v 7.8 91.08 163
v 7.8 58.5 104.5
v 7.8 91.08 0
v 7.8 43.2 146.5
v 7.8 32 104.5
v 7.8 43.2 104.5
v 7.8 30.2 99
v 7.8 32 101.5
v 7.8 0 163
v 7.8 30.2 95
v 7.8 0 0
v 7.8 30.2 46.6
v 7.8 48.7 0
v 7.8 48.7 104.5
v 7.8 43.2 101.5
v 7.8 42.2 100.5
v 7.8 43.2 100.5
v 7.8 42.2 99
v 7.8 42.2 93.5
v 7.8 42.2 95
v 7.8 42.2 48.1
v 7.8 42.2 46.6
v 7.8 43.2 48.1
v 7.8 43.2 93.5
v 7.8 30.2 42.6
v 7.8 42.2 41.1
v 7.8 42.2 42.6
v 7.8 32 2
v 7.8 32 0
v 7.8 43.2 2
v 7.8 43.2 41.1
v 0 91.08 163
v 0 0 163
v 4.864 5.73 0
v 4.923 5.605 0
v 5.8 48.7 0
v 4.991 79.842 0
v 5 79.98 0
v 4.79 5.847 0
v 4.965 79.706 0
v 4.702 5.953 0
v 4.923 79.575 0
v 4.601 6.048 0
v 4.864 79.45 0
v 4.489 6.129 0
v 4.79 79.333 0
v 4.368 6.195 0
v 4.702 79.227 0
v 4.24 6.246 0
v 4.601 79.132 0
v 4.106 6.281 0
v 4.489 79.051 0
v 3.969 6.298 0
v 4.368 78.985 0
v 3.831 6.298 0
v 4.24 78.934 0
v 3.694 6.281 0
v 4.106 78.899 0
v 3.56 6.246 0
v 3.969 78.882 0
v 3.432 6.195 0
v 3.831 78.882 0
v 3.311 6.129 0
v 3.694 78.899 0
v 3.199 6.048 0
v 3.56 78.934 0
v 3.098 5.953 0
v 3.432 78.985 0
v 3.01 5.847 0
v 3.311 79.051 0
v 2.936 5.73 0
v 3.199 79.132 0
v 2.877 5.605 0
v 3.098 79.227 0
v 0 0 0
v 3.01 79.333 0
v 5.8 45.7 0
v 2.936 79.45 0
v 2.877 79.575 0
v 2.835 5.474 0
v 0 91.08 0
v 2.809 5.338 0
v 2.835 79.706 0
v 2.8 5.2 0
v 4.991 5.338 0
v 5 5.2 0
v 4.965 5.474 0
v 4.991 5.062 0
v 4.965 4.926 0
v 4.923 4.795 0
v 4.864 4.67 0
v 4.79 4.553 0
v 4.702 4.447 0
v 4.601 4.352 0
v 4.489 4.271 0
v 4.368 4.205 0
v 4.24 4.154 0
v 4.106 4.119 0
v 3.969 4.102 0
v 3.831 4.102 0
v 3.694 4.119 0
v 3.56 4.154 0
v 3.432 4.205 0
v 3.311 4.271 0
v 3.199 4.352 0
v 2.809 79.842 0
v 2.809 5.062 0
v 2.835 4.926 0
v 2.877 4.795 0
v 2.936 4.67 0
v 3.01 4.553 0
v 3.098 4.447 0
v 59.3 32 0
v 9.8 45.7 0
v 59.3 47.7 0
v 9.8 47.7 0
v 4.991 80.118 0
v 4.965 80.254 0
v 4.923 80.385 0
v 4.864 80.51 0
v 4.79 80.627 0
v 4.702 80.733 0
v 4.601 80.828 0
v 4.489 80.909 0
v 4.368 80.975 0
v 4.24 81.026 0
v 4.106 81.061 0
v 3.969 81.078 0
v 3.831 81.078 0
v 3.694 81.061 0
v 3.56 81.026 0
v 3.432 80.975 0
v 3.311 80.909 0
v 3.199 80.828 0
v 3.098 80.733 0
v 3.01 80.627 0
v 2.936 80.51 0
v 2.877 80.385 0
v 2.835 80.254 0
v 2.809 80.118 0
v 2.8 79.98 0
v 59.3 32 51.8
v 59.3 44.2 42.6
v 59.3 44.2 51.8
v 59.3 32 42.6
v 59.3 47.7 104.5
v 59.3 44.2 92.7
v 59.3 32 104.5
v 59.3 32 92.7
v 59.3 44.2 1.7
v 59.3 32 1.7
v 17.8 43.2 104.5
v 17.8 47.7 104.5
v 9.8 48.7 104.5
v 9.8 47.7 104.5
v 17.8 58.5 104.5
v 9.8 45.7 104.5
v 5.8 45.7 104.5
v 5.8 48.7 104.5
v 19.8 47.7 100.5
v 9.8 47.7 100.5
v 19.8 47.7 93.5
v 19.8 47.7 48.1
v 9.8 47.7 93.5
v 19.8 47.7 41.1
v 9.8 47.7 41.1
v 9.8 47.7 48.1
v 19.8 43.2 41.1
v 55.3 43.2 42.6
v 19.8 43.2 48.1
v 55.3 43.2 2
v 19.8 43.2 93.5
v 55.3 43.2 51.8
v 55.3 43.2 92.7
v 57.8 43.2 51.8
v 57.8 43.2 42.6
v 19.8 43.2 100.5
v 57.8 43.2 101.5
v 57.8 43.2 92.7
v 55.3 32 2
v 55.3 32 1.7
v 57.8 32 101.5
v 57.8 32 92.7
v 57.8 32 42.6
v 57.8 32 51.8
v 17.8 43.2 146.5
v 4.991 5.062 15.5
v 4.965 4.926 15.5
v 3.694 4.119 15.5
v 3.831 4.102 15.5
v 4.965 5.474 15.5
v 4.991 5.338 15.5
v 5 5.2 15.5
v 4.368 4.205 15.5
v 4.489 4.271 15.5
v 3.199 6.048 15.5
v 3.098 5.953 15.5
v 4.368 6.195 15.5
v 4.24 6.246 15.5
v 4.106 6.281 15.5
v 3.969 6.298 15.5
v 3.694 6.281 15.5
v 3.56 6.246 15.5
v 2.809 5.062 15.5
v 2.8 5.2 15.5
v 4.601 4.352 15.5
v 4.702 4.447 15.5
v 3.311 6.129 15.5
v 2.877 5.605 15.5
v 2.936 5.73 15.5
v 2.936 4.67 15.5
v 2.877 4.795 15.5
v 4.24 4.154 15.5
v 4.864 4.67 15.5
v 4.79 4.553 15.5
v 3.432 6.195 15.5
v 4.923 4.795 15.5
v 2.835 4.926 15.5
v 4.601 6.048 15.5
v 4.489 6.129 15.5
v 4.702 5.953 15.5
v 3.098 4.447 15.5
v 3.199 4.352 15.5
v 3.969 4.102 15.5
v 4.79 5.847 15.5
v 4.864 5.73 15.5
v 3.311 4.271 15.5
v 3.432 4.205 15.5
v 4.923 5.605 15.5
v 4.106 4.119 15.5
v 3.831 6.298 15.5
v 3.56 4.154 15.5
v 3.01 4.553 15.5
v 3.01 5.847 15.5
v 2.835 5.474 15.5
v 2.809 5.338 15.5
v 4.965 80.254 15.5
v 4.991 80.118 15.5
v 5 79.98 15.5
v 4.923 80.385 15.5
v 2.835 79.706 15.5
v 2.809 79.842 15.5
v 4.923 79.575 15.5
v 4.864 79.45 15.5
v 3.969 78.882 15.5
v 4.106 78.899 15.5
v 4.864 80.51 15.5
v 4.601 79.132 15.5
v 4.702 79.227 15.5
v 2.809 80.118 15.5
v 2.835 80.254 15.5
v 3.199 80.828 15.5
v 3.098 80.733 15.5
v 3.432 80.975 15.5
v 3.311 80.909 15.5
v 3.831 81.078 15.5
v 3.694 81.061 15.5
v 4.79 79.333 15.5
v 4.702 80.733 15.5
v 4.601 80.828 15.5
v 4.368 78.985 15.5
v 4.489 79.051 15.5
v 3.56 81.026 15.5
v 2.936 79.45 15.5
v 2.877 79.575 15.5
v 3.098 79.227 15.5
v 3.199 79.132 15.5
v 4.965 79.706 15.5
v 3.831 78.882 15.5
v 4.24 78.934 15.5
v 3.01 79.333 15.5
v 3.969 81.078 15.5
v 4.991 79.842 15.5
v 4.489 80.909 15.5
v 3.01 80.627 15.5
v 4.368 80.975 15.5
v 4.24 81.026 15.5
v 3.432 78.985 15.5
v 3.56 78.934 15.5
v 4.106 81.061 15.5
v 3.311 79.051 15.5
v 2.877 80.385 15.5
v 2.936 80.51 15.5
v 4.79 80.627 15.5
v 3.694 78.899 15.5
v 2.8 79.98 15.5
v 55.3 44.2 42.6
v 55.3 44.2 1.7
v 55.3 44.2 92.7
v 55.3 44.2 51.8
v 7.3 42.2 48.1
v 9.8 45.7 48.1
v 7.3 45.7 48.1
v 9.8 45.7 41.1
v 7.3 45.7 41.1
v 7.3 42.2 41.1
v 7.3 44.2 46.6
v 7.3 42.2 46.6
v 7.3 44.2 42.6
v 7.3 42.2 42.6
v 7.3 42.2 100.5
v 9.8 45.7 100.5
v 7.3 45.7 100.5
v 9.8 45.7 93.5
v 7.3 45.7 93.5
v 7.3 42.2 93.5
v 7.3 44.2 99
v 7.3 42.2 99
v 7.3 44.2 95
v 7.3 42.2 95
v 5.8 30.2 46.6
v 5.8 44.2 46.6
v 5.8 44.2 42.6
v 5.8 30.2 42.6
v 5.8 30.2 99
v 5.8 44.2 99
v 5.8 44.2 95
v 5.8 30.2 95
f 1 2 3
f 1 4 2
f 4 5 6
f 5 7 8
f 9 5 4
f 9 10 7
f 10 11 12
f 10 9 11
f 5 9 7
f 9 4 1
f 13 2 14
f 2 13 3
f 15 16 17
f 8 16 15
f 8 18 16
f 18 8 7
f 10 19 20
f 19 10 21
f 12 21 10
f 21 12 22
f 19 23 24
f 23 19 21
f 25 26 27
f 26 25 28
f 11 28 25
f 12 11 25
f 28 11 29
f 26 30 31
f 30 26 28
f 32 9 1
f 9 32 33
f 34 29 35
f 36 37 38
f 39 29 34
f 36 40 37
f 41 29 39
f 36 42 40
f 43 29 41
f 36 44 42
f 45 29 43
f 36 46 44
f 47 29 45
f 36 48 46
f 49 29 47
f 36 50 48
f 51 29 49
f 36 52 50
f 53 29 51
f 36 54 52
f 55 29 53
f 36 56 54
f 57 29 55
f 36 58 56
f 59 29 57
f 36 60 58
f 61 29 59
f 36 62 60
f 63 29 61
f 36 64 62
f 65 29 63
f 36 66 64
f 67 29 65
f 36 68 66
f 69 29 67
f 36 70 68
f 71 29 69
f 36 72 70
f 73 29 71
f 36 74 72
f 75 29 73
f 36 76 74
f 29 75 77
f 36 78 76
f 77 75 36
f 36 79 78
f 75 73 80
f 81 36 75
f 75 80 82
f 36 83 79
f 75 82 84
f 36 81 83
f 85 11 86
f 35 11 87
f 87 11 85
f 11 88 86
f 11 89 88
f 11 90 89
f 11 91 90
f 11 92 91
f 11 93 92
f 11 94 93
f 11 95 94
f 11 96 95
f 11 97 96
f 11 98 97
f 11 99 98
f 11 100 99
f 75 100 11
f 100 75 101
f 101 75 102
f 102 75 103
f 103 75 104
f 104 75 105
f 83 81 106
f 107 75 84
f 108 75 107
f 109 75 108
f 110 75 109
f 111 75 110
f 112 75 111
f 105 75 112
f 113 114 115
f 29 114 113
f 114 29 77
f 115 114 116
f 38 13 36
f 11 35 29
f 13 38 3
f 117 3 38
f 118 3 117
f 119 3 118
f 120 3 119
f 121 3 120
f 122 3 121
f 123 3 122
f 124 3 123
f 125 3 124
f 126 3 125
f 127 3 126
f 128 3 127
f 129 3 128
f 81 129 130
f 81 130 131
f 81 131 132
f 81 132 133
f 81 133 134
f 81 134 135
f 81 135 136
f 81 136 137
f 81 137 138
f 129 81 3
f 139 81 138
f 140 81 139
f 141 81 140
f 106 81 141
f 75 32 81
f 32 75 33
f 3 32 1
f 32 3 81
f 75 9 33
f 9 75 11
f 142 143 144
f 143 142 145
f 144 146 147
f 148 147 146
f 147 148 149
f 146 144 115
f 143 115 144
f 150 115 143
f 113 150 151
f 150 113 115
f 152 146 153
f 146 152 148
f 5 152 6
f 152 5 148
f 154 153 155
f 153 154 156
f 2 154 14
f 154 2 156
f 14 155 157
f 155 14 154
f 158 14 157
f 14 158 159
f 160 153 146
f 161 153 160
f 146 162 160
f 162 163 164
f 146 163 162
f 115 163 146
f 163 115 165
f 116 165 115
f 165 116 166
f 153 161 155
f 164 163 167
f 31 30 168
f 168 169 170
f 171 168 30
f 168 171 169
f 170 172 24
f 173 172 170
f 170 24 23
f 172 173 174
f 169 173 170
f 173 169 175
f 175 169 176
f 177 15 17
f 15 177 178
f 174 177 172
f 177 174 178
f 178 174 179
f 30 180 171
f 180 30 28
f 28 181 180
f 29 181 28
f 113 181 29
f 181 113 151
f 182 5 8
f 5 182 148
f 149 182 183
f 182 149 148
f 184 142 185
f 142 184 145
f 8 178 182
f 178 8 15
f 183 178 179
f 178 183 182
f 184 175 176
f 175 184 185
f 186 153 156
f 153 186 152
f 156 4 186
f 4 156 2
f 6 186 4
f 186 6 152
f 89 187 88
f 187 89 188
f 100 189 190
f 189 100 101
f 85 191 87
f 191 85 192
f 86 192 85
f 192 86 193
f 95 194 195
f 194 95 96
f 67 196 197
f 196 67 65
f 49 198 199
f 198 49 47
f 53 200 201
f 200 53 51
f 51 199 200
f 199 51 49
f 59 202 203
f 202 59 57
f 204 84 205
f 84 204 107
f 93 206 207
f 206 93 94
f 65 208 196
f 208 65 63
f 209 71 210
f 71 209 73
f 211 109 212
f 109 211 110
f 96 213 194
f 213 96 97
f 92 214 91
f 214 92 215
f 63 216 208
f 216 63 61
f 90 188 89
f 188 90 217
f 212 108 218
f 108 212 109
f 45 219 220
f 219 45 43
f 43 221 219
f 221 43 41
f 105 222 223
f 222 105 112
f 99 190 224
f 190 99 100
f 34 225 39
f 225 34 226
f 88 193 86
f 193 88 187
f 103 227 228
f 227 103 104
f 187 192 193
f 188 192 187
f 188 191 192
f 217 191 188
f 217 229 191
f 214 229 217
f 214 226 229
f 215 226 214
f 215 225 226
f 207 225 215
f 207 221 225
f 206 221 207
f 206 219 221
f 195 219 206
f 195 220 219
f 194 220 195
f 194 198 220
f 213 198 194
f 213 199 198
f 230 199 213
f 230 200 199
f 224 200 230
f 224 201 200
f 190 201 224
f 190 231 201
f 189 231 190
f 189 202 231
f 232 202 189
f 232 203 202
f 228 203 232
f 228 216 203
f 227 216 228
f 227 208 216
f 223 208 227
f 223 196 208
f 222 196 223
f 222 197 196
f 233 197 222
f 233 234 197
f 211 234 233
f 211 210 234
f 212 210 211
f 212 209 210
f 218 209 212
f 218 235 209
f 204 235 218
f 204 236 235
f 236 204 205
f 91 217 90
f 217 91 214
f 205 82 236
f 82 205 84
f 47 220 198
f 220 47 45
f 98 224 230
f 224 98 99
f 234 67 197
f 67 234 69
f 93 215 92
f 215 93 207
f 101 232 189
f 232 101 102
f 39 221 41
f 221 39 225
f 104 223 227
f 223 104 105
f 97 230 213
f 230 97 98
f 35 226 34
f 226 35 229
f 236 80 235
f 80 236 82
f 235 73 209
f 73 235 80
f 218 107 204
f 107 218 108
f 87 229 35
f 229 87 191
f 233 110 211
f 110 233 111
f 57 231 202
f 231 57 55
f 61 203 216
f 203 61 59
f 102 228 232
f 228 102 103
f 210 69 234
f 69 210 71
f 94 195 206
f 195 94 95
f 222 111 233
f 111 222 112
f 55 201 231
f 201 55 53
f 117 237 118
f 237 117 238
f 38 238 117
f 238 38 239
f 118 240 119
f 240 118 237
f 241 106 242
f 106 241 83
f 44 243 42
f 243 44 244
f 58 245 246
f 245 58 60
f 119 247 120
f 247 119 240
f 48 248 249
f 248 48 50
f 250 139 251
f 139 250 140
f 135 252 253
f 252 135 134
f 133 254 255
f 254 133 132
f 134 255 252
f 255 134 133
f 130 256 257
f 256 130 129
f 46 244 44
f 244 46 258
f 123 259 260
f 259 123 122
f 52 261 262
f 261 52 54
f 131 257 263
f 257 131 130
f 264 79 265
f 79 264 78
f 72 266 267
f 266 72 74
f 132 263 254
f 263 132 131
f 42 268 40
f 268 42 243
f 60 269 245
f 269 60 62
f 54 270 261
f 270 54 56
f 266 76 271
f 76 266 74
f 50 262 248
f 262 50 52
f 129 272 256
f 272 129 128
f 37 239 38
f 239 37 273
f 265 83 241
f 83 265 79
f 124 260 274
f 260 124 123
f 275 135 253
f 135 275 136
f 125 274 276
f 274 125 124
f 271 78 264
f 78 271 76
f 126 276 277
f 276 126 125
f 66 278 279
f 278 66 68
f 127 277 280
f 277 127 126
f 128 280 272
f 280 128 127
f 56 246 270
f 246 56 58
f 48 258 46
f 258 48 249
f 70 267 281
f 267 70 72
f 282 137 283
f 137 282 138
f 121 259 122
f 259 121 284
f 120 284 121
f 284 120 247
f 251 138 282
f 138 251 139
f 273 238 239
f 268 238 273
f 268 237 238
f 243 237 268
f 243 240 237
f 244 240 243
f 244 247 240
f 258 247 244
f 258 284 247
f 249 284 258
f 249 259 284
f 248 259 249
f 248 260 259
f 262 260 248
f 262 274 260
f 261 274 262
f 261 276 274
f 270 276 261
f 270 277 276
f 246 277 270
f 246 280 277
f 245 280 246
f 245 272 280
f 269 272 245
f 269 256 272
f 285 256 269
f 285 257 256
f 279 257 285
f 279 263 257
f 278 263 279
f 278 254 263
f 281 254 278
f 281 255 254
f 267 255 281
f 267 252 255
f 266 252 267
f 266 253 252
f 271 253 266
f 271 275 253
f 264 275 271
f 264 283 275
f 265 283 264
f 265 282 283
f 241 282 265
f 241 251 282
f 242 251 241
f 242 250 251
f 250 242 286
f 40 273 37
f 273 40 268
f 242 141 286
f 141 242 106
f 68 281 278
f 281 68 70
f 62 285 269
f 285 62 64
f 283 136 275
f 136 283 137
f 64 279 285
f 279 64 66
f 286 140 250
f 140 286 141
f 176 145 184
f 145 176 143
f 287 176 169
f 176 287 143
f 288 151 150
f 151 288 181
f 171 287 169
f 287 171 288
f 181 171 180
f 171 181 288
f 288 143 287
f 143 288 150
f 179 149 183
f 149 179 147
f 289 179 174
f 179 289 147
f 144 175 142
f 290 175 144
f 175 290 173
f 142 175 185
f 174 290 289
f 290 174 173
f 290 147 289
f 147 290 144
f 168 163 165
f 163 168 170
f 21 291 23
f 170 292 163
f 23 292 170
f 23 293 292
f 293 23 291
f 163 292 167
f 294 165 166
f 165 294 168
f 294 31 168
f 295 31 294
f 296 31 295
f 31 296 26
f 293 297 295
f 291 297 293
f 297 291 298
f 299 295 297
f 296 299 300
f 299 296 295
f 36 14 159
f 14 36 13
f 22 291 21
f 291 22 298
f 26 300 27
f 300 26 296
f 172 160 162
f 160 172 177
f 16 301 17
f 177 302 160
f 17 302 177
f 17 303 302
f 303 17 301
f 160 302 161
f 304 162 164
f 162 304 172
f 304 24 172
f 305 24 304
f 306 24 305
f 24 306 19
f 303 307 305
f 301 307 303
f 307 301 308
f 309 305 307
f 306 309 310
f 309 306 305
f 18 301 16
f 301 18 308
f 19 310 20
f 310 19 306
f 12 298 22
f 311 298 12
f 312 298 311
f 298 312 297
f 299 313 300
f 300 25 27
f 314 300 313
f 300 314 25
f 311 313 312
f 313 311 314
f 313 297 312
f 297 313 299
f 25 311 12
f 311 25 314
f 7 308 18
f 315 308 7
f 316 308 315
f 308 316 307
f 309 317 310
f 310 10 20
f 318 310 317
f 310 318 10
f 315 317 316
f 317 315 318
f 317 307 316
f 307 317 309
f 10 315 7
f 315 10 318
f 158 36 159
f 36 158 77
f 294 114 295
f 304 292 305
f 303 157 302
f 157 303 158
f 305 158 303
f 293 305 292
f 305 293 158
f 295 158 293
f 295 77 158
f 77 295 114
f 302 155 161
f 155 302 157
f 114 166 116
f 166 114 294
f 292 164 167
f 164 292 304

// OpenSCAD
// ==========================================================
// NAS 双 5010 涡轮风扇 T 型刚性固定支架 (最新实测定稿版)
// 适配: TANK米多贝克 6盘位NAS机箱 + MATX All-in-One + 4热管被动散热器改装
// 坐标定义: X+ 向右(直吹散热鳍片), Y+ 向后(机箱尾部), Z+ 向下(机箱底板)
// ==========================================================

$fn = 50;

// ------------ 关键尺寸参数 (单位: mm) ------------
// 1. 机箱空间与主立板基础尺寸
total_height        = 163.0;    // 机箱顶梁接触面到机箱金属底板总高 (Z: 0 -> 163)
main_plate_th       = 7.8;      // 主固定立板厚度 (X: 0 -> 7.8, 由9.8mm缩减2.0mm，消除机箱滑入装配干涉)

// 2. 螺栓孔参数 (适配梁上原装孔位与 M2.6 自攻螺丝)
h1_y                = 5.20;     // H1 中心距前方阻挡物(硬盘笼端面)基准距离
hole_pitch          = 74.78;    // 两螺栓孔中心距 (实测精确值)
h2_y                = h1_y + hole_pitch; // 79.98mm
hole_dia            = 2.2;      // 适配 M2.6 自攻螺丝底孔 (梁上孔径实测 2.71/2.74mm)
hole_x_offset       = 3.9;      // 螺孔居中于主板厚度 (7.8 / 2 = 3.9mm)
screw_depth         = 15.0;     // 垂直向下钻孔深度 (盲孔设计，无需穿透)
main_plate_len      = h2_y + (hole_dia / 2) + 10.0; // 91.08mm (H2孔后保留10mm肉厚)

// 3. 5010 涡轮风扇实测参数 (单颗)
fan_w               = 50.0;     // 风扇正面宽度 (X 方向，实测 50.01mm)
fan_h               = 50.1;     // 单个风扇高度 (Z 方向，双扇堆叠实测 100.18mm)
fan_th              = 10.8;     // 风扇机身厚度 (Y 方向，实测 10.80mm)
fan_outlet_h        = 40.9;     // 单扇出风口垂直有效高度 (实测 40.9mm)
fan_outlet_top_gap  = 1.7;      // 出风口上边缘距机壳外沿厚度

// 4. Y 轴对中定位 (进风面距阻挡物 32mm，喷嘴居中对准散热鳍片核心区)
fan_front_y         = 32.0;     // 进风面距前方阻挡物 32.0mm
fit_tol             = 0.4;      // 减震泡棉微过盈装配公差
back_plate_th       = 4.5;      // 风扇后背支撑立板厚度 (Y 方向)
fan_back_plate_y    = fan_front_y + fan_th + fit_tol; // 约 43.2mm

// 5. Z 轴垂直定位与风扇仓尺寸微调 (高宽各扩容 1.5mm，限位减薄 1.0mm，总净空各增 2.5mm)
fan_holder_w        = 51.5;     // 向右伸出宽度 (X: 由 50.0mm 增至 51.5mm)
fan_holder_h        = 104.5;    // 容纳双风扇垂直堆叠总高 (Z: 由 103.0mm 增至 104.5mm)
fan_z_top           = 0.0;      // 挂板顶端对齐顶梁接触面 (Z = 0)
fan_z_bottom        = fan_z_top + fan_holder_h; // Z = 104.5mm，下方保留近 60mm 避开排气扇

// 6. 穿线孔与共面全贯通导线系统参数
plug_hole_w         = 12.0;     // 4-Pin 插头穿线孔长 (X 方向)
plug_hole_h         = 7.0;      // 4-Pin 插头穿线孔高 (Z 方向)
groove_depth        = 2.0;      // 全局导线槽深度 (深 2.0mm，匹配 2.02mm 线宽)
groove_width        = 4.0;      // 全局导线槽宽度 (宽 4.0mm)
side_groove_len     = 13.0;     // 主板内侧贴靠导线槽长度 (Y 方向)

module fan_bracket_v8_final() {
    difference() {
        // ----------------- 实体构建 (Union) -----------------
        union() {
            // 1. 主固定立板 (贴梁下挂触底，Z: 0 -> 163mm，板厚 7.8mm)
            translate([0, 0, 0])
                cube([main_plate_th, main_plate_len, total_height]);

            // 2. T 型向右伸出的风扇承载挂板 (位于风扇后侧，Z: 0 -> 104.5mm)
            translate([main_plate_th, fan_back_plate_y, fan_z_top])
                cube([fan_holder_w, back_plate_th, fan_holder_h]);

            // 3. 风扇仓顶部限位挡板 (厚度减薄至 2.0mm，增加垂直容差)
            translate([main_plate_th, fan_front_y, fan_z_top])
                cube([fan_holder_w, fan_th + fit_tol, 2.0]);

            // 4. 风扇仓底部承托板 (厚度 3.0mm，Z = 104.5mm)
            translate([main_plate_th, fan_front_y, fan_z_bottom - 3.0])
                cube([fan_holder_w, fan_th + fit_tol, 3.0]);

            // 5. 风扇右侧限位立壁 (厚度减薄至 1.5mm，增加水平容差)
            translate([main_plate_th + fan_holder_w - 1.5, fan_front_y, fan_z_top])
                cube([1.5, fan_th + fit_tol, fan_holder_h]);

            // 6. 下方三角加强筋支撑 (完全实心闭合结构，提升抗振刚度与打印层间强度)
            translate([main_plate_th, fan_back_plate_y, fan_z_bottom])
                rotate([90, 0, 90])
                    linear_extrude(height = 10.0)
                        polygon(points = [[0, 0], [back_plate_th + fan_th, 0], [0, 42]]);
        }

        // ----------------- 扣减挖空 (Difference) -----------------

        // A. H1 螺栓孔 (垂直向下钻入盲孔，深度 15mm，孔径 2.2mm)
        translate([hole_x_offset, h1_y, -0.5])
            cylinder(d = hole_dia, h = screw_depth + 1);

        // B. H2 螺栓孔 (中心距 74.78mm，垂直向下钻入盲孔)
        translate([hole_x_offset, h2_y, -0.5])
            cylinder(d = hole_dia, h = screw_depth + 1);

        // C. 上层风扇出风口开槽 (右侧正对鳍片吹风，开孔高度 40.9mm)
        translate([
            main_plate_th + fan_holder_w - 4.0,
            fan_front_y - 1.0,
            fan_z_top + fan_outlet_top_gap
        ])
            cube([6.0, fan_th + fit_tol + 2.0, fan_outlet_h]);

        // D. 下层风扇出风口开槽 (右侧正对鳍片吹风，开孔高度 40.9mm)
        translate([
            main_plate_th + fan_holder_w - 4.0,
            fan_front_y - 1.0,
            fan_z_top + fan_h + fan_outlet_top_gap
        ])
            cube([6.0, fan_th + fit_tol + 2.0, fan_outlet_h]);

        // ----------------- 4-Pin 穿线孔 (完全紧靠主板根部) -----------------
        // E1. 上层风扇穿线孔 (起点 X = main_plate_th - 0.5，确保穿透交界面)
        translate([
            main_plate_th - 0.5,
            fan_back_plate_y - 1.0,
            fan_z_top + fan_h - plug_hole_h - 2.0
        ])
            cube([plug_hole_w + 0.5, back_plate_th + 2.0, plug_hole_h]);

        // E2. 下层风扇穿线孔 (起点 X = main_plate_th - 0.5)
        translate([
            main_plate_th - 0.5,
            fan_back_plate_y - 1.0,
            fan_z_bottom - plug_hole_h - 4.0
        ])
            cube([plug_hole_w + 0.5, back_plate_th + 2.0, plug_hole_h]);

        // ----------------- 主板内侧贴靠导线槽 -----------------
        // F1. 上风扇主板导线槽 (长 13mm，深 2mm，高 4mm，与穿线孔无缝贯通)
        translate([
            main_plate_th - groove_depth,
            fan_back_plate_y - side_groove_len,
            fan_z_top + fan_h - plug_hole_h - 2.0 + (plug_hole_h - groove_width) / 2
        ])
            cube([groove_depth + 1.0, side_groove_len + 1.0, groove_width]);

        // F2. 下风扇主板导线槽
        translate([
            main_plate_th - groove_depth,
            fan_back_plate_y - side_groove_len,
            fan_z_bottom - plug_hole_h - 4.0 + (plug_hole_h - groove_width) / 2
        ])
            cube([groove_depth + 1.0, side_groove_len + 1.0, groove_width]);

        // ----------------- 背面导线槽网络 (与内侧槽严格共面 X = main_plate_th - groove_depth) -----------------
        // G1. 上层背面横向导线槽 (彻底切平台阶壁，X 深度与内侧槽一致)
        translate([
            main_plate_th - groove_depth,
            fan_back_plate_y + back_plate_th - groove_depth,
            fan_z_top + fan_h - plug_hole_h - 2.0 + (plug_hole_h - groove_width) / 2
        ])
            cube([plug_hole_w + groove_depth, groove_depth + 1.0, groove_width]);

        // G2. 下层背面横向导线槽
        translate([
            main_plate_th - groove_depth,
            fan_back_plate_y + back_plate_th - groove_depth,
            fan_z_bottom - plug_hole_h - 4.0 + (plug_hole_h - groove_width) / 2
        ])
            cube([plug_hole_w + groove_depth, groove_depth + 1.0, groove_width]);

        // H. 垂直主走线槽 (深 2.0mm，宽 4.0mm，止步于 Z = 104.5mm 挂板下沿，保留三角筋完整)
        translate([
            main_plate_th - groove_depth,
            fan_back_plate_y + back_plate_th - groove_depth,
            fan_z_top
        ])
            cube([groove_width, groove_depth + 1.0, fan_holder_h]);
    }
}

// 渲染模型
fan_bracket_v8_final();
